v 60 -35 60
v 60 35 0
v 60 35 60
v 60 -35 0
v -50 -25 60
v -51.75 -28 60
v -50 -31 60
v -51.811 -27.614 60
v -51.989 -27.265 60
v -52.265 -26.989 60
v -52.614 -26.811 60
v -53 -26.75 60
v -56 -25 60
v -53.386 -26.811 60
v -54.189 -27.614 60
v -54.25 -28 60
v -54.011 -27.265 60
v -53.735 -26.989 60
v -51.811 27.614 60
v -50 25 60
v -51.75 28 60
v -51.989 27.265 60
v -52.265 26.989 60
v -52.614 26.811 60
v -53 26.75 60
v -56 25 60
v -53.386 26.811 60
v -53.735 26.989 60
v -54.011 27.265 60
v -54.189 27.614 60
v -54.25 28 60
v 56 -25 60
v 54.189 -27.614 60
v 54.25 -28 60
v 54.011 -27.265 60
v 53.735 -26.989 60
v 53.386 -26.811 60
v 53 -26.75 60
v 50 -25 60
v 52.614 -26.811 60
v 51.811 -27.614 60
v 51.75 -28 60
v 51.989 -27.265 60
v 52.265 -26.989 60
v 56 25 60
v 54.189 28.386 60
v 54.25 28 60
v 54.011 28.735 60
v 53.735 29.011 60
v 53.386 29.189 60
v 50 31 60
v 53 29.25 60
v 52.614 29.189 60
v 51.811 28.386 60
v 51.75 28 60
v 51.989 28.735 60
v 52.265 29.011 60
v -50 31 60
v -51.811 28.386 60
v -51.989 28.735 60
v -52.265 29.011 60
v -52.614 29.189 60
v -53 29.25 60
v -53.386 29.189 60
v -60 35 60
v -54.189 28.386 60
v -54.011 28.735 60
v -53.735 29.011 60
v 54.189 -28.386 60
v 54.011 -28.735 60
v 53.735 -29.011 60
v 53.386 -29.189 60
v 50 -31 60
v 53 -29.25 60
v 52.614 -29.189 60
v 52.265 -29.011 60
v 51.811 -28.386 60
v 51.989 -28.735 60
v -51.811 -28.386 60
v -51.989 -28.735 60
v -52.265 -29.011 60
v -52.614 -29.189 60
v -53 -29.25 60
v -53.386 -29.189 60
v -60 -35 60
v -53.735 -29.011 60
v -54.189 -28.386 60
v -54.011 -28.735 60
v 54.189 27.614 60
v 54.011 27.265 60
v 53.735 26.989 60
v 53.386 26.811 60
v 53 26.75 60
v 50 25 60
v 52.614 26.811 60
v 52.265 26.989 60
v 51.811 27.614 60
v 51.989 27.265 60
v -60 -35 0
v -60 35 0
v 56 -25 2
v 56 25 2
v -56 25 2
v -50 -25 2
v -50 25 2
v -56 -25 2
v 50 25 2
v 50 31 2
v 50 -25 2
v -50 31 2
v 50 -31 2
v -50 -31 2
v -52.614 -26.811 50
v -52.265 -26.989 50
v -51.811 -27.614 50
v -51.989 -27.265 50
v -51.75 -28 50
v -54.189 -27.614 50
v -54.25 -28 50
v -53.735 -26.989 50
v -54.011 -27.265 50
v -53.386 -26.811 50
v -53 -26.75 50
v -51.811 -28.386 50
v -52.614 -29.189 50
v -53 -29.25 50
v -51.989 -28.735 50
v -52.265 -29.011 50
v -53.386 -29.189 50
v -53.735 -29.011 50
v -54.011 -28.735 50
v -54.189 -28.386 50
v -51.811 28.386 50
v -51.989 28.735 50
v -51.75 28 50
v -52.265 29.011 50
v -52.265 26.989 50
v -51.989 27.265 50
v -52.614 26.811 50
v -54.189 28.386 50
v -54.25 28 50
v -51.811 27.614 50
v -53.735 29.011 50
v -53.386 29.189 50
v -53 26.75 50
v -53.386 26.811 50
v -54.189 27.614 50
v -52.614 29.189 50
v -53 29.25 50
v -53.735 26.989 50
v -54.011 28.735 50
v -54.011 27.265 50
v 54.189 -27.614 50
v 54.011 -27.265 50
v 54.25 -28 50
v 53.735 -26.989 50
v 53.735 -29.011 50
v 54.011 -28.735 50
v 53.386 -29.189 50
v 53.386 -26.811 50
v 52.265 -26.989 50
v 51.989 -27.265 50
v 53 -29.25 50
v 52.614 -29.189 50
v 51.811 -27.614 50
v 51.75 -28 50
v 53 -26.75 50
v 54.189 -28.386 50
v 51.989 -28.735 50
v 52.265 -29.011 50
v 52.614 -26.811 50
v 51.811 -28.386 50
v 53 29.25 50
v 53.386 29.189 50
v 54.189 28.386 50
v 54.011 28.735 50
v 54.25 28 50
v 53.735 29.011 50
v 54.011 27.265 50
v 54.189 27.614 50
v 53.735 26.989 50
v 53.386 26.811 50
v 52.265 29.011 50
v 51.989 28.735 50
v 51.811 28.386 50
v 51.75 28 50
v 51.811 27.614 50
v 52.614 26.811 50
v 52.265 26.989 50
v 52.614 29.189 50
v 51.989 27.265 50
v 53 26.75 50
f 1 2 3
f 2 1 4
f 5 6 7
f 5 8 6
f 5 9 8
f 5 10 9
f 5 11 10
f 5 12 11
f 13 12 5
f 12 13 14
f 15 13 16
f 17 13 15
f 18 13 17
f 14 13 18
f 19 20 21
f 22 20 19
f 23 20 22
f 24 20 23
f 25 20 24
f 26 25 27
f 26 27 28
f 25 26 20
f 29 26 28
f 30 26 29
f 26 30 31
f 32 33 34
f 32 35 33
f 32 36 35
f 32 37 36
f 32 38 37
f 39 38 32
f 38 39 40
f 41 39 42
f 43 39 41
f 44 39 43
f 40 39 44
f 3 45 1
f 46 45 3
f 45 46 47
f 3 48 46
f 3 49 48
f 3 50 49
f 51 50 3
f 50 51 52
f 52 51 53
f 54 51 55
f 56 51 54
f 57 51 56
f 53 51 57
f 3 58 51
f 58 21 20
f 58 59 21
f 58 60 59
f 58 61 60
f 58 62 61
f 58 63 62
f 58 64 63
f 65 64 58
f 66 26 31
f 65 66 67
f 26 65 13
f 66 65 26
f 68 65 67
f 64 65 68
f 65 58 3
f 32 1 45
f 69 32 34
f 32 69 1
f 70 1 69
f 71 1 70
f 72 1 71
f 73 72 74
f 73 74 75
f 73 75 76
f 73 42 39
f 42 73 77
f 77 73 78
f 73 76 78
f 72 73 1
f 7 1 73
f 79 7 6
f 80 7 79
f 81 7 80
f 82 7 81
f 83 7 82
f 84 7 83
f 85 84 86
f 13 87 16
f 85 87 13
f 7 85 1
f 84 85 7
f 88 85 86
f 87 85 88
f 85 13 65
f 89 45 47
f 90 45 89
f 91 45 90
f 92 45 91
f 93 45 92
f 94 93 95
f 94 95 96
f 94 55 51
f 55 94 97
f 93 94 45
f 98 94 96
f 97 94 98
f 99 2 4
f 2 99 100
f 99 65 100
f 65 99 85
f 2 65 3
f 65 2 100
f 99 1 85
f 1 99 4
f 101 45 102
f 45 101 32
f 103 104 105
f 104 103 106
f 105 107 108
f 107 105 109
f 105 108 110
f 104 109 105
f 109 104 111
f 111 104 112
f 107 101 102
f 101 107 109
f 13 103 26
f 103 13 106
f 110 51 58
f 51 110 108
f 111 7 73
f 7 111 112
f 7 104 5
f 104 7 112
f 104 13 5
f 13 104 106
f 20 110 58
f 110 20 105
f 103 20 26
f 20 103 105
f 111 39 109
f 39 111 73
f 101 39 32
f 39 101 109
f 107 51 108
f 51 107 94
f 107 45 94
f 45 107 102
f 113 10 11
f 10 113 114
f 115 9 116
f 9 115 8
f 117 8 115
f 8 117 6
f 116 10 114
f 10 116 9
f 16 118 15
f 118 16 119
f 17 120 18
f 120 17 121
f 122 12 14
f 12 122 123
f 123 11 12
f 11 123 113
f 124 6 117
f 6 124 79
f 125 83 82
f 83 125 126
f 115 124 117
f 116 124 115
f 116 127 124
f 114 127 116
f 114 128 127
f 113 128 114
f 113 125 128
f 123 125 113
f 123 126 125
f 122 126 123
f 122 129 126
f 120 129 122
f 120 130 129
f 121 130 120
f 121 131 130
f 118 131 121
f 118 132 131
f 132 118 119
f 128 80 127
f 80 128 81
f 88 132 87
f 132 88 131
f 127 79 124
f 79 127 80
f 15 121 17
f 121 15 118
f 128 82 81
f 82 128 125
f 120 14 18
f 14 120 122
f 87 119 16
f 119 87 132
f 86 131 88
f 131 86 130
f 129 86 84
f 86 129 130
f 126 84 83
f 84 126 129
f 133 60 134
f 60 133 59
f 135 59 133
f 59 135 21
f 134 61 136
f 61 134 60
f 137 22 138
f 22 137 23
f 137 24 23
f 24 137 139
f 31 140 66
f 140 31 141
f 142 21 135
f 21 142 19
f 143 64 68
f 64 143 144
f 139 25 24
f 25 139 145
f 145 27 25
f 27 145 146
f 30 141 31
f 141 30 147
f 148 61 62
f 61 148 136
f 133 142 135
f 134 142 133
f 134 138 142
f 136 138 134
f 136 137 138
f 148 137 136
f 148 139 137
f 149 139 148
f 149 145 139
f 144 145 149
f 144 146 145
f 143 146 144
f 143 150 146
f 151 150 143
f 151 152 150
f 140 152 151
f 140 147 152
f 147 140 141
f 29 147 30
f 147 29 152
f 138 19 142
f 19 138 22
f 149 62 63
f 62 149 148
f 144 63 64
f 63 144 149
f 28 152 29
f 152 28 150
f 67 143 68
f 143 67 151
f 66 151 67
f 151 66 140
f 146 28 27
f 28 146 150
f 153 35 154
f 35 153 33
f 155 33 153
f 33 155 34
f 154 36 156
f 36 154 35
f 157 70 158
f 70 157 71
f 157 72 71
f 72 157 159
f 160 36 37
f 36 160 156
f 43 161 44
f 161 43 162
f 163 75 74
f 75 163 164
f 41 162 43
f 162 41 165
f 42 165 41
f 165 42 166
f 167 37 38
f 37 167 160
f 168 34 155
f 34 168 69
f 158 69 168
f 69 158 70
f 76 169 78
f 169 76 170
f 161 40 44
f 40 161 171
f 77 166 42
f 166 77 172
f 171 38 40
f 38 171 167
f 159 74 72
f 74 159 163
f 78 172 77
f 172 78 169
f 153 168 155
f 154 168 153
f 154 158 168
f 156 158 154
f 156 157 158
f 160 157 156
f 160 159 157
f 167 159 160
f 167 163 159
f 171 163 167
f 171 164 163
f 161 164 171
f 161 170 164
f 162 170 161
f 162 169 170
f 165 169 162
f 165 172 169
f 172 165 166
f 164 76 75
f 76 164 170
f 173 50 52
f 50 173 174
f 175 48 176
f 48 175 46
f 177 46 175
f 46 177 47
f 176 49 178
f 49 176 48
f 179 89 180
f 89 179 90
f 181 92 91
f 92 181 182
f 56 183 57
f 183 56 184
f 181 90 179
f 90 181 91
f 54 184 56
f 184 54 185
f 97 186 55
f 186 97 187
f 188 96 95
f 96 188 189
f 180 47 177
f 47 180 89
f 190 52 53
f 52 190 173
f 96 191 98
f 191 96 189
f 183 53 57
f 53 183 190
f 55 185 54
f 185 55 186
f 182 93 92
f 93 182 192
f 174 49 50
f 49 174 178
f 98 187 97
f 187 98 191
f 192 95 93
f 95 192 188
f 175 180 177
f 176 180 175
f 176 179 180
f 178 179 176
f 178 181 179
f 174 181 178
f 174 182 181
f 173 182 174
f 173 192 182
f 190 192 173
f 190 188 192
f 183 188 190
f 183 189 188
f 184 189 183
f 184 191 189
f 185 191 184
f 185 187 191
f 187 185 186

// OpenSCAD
//Geometria de una caja parametrizada
//Parametros :
    //Largo de la caja :
        l=120;
    //Ancho de la caja :
        a=70;
    //Alto de la caja :( minimo = 10+e )
        h=60;
    //Espesor de la caja :
        e=4;
    //Medida columna atornillado :
        c=6;
    //Medida diametro de taladros:
        m=1.25;


//Caja + columnas con agujeros tornillos
difference(){
// Caja hueca + 4 columnas macizas       
union(){
    translate([-l/2,-a/2,0])
difference(){
//Superficie exterior
    cube([l,a,h]);
//Hueco interior
translate([e,e,e/2])
    cube([l-2*e,a-2*e,h]);
}

//Columnas para atornillar la tapa

//Col inf izq
    translate([-l/2+e,-a/2+e,e/2])
        cube([c,c,h-e/2]);
//Col sup izq
    translate([-l/2+e,a/2-e-c,e/2])
        cube([c,c,h-e/2]);
//Col inf drcha
    translate([l/2-e-c,-a/2+e,e/2])
        cube([c,c,h-e/2]);
//Col sup drcha
    translate([l/2-e-c,a/2-e-c,e/2])
        cube([c,c,h-e/2]);
}

//Matriz de Agujeros para atornillar la tapa superior
union(){
//Inf-Iz
    translate([-l/2+e+c/2,-a/2+e+c/2,h-10])
        cylinder(r=m,h=15,$fn=20);
//Sup-Iz
translate([0,a-2*e-c,0])    
    translate([-l/2+e+c/2,-a/2+e+c/2,h-10])
        cylinder(r=m,h=15,$fn=20);
//Inf-Dcha
translate([l-2*e-c,0,0])
    translate([-l/2+e+c/2,-a/2+e+c/2,h-10])
        cylinder(r=m,h=15,$fn=20);
//Sup-Dcha
translate([l-2*e-c,a-2*e-c,0])
    translate([-l/2+e+c/2,-a/2+e+c/2,h-10])
        cylinder(r=m,h=15,$fn=20);
}
}
